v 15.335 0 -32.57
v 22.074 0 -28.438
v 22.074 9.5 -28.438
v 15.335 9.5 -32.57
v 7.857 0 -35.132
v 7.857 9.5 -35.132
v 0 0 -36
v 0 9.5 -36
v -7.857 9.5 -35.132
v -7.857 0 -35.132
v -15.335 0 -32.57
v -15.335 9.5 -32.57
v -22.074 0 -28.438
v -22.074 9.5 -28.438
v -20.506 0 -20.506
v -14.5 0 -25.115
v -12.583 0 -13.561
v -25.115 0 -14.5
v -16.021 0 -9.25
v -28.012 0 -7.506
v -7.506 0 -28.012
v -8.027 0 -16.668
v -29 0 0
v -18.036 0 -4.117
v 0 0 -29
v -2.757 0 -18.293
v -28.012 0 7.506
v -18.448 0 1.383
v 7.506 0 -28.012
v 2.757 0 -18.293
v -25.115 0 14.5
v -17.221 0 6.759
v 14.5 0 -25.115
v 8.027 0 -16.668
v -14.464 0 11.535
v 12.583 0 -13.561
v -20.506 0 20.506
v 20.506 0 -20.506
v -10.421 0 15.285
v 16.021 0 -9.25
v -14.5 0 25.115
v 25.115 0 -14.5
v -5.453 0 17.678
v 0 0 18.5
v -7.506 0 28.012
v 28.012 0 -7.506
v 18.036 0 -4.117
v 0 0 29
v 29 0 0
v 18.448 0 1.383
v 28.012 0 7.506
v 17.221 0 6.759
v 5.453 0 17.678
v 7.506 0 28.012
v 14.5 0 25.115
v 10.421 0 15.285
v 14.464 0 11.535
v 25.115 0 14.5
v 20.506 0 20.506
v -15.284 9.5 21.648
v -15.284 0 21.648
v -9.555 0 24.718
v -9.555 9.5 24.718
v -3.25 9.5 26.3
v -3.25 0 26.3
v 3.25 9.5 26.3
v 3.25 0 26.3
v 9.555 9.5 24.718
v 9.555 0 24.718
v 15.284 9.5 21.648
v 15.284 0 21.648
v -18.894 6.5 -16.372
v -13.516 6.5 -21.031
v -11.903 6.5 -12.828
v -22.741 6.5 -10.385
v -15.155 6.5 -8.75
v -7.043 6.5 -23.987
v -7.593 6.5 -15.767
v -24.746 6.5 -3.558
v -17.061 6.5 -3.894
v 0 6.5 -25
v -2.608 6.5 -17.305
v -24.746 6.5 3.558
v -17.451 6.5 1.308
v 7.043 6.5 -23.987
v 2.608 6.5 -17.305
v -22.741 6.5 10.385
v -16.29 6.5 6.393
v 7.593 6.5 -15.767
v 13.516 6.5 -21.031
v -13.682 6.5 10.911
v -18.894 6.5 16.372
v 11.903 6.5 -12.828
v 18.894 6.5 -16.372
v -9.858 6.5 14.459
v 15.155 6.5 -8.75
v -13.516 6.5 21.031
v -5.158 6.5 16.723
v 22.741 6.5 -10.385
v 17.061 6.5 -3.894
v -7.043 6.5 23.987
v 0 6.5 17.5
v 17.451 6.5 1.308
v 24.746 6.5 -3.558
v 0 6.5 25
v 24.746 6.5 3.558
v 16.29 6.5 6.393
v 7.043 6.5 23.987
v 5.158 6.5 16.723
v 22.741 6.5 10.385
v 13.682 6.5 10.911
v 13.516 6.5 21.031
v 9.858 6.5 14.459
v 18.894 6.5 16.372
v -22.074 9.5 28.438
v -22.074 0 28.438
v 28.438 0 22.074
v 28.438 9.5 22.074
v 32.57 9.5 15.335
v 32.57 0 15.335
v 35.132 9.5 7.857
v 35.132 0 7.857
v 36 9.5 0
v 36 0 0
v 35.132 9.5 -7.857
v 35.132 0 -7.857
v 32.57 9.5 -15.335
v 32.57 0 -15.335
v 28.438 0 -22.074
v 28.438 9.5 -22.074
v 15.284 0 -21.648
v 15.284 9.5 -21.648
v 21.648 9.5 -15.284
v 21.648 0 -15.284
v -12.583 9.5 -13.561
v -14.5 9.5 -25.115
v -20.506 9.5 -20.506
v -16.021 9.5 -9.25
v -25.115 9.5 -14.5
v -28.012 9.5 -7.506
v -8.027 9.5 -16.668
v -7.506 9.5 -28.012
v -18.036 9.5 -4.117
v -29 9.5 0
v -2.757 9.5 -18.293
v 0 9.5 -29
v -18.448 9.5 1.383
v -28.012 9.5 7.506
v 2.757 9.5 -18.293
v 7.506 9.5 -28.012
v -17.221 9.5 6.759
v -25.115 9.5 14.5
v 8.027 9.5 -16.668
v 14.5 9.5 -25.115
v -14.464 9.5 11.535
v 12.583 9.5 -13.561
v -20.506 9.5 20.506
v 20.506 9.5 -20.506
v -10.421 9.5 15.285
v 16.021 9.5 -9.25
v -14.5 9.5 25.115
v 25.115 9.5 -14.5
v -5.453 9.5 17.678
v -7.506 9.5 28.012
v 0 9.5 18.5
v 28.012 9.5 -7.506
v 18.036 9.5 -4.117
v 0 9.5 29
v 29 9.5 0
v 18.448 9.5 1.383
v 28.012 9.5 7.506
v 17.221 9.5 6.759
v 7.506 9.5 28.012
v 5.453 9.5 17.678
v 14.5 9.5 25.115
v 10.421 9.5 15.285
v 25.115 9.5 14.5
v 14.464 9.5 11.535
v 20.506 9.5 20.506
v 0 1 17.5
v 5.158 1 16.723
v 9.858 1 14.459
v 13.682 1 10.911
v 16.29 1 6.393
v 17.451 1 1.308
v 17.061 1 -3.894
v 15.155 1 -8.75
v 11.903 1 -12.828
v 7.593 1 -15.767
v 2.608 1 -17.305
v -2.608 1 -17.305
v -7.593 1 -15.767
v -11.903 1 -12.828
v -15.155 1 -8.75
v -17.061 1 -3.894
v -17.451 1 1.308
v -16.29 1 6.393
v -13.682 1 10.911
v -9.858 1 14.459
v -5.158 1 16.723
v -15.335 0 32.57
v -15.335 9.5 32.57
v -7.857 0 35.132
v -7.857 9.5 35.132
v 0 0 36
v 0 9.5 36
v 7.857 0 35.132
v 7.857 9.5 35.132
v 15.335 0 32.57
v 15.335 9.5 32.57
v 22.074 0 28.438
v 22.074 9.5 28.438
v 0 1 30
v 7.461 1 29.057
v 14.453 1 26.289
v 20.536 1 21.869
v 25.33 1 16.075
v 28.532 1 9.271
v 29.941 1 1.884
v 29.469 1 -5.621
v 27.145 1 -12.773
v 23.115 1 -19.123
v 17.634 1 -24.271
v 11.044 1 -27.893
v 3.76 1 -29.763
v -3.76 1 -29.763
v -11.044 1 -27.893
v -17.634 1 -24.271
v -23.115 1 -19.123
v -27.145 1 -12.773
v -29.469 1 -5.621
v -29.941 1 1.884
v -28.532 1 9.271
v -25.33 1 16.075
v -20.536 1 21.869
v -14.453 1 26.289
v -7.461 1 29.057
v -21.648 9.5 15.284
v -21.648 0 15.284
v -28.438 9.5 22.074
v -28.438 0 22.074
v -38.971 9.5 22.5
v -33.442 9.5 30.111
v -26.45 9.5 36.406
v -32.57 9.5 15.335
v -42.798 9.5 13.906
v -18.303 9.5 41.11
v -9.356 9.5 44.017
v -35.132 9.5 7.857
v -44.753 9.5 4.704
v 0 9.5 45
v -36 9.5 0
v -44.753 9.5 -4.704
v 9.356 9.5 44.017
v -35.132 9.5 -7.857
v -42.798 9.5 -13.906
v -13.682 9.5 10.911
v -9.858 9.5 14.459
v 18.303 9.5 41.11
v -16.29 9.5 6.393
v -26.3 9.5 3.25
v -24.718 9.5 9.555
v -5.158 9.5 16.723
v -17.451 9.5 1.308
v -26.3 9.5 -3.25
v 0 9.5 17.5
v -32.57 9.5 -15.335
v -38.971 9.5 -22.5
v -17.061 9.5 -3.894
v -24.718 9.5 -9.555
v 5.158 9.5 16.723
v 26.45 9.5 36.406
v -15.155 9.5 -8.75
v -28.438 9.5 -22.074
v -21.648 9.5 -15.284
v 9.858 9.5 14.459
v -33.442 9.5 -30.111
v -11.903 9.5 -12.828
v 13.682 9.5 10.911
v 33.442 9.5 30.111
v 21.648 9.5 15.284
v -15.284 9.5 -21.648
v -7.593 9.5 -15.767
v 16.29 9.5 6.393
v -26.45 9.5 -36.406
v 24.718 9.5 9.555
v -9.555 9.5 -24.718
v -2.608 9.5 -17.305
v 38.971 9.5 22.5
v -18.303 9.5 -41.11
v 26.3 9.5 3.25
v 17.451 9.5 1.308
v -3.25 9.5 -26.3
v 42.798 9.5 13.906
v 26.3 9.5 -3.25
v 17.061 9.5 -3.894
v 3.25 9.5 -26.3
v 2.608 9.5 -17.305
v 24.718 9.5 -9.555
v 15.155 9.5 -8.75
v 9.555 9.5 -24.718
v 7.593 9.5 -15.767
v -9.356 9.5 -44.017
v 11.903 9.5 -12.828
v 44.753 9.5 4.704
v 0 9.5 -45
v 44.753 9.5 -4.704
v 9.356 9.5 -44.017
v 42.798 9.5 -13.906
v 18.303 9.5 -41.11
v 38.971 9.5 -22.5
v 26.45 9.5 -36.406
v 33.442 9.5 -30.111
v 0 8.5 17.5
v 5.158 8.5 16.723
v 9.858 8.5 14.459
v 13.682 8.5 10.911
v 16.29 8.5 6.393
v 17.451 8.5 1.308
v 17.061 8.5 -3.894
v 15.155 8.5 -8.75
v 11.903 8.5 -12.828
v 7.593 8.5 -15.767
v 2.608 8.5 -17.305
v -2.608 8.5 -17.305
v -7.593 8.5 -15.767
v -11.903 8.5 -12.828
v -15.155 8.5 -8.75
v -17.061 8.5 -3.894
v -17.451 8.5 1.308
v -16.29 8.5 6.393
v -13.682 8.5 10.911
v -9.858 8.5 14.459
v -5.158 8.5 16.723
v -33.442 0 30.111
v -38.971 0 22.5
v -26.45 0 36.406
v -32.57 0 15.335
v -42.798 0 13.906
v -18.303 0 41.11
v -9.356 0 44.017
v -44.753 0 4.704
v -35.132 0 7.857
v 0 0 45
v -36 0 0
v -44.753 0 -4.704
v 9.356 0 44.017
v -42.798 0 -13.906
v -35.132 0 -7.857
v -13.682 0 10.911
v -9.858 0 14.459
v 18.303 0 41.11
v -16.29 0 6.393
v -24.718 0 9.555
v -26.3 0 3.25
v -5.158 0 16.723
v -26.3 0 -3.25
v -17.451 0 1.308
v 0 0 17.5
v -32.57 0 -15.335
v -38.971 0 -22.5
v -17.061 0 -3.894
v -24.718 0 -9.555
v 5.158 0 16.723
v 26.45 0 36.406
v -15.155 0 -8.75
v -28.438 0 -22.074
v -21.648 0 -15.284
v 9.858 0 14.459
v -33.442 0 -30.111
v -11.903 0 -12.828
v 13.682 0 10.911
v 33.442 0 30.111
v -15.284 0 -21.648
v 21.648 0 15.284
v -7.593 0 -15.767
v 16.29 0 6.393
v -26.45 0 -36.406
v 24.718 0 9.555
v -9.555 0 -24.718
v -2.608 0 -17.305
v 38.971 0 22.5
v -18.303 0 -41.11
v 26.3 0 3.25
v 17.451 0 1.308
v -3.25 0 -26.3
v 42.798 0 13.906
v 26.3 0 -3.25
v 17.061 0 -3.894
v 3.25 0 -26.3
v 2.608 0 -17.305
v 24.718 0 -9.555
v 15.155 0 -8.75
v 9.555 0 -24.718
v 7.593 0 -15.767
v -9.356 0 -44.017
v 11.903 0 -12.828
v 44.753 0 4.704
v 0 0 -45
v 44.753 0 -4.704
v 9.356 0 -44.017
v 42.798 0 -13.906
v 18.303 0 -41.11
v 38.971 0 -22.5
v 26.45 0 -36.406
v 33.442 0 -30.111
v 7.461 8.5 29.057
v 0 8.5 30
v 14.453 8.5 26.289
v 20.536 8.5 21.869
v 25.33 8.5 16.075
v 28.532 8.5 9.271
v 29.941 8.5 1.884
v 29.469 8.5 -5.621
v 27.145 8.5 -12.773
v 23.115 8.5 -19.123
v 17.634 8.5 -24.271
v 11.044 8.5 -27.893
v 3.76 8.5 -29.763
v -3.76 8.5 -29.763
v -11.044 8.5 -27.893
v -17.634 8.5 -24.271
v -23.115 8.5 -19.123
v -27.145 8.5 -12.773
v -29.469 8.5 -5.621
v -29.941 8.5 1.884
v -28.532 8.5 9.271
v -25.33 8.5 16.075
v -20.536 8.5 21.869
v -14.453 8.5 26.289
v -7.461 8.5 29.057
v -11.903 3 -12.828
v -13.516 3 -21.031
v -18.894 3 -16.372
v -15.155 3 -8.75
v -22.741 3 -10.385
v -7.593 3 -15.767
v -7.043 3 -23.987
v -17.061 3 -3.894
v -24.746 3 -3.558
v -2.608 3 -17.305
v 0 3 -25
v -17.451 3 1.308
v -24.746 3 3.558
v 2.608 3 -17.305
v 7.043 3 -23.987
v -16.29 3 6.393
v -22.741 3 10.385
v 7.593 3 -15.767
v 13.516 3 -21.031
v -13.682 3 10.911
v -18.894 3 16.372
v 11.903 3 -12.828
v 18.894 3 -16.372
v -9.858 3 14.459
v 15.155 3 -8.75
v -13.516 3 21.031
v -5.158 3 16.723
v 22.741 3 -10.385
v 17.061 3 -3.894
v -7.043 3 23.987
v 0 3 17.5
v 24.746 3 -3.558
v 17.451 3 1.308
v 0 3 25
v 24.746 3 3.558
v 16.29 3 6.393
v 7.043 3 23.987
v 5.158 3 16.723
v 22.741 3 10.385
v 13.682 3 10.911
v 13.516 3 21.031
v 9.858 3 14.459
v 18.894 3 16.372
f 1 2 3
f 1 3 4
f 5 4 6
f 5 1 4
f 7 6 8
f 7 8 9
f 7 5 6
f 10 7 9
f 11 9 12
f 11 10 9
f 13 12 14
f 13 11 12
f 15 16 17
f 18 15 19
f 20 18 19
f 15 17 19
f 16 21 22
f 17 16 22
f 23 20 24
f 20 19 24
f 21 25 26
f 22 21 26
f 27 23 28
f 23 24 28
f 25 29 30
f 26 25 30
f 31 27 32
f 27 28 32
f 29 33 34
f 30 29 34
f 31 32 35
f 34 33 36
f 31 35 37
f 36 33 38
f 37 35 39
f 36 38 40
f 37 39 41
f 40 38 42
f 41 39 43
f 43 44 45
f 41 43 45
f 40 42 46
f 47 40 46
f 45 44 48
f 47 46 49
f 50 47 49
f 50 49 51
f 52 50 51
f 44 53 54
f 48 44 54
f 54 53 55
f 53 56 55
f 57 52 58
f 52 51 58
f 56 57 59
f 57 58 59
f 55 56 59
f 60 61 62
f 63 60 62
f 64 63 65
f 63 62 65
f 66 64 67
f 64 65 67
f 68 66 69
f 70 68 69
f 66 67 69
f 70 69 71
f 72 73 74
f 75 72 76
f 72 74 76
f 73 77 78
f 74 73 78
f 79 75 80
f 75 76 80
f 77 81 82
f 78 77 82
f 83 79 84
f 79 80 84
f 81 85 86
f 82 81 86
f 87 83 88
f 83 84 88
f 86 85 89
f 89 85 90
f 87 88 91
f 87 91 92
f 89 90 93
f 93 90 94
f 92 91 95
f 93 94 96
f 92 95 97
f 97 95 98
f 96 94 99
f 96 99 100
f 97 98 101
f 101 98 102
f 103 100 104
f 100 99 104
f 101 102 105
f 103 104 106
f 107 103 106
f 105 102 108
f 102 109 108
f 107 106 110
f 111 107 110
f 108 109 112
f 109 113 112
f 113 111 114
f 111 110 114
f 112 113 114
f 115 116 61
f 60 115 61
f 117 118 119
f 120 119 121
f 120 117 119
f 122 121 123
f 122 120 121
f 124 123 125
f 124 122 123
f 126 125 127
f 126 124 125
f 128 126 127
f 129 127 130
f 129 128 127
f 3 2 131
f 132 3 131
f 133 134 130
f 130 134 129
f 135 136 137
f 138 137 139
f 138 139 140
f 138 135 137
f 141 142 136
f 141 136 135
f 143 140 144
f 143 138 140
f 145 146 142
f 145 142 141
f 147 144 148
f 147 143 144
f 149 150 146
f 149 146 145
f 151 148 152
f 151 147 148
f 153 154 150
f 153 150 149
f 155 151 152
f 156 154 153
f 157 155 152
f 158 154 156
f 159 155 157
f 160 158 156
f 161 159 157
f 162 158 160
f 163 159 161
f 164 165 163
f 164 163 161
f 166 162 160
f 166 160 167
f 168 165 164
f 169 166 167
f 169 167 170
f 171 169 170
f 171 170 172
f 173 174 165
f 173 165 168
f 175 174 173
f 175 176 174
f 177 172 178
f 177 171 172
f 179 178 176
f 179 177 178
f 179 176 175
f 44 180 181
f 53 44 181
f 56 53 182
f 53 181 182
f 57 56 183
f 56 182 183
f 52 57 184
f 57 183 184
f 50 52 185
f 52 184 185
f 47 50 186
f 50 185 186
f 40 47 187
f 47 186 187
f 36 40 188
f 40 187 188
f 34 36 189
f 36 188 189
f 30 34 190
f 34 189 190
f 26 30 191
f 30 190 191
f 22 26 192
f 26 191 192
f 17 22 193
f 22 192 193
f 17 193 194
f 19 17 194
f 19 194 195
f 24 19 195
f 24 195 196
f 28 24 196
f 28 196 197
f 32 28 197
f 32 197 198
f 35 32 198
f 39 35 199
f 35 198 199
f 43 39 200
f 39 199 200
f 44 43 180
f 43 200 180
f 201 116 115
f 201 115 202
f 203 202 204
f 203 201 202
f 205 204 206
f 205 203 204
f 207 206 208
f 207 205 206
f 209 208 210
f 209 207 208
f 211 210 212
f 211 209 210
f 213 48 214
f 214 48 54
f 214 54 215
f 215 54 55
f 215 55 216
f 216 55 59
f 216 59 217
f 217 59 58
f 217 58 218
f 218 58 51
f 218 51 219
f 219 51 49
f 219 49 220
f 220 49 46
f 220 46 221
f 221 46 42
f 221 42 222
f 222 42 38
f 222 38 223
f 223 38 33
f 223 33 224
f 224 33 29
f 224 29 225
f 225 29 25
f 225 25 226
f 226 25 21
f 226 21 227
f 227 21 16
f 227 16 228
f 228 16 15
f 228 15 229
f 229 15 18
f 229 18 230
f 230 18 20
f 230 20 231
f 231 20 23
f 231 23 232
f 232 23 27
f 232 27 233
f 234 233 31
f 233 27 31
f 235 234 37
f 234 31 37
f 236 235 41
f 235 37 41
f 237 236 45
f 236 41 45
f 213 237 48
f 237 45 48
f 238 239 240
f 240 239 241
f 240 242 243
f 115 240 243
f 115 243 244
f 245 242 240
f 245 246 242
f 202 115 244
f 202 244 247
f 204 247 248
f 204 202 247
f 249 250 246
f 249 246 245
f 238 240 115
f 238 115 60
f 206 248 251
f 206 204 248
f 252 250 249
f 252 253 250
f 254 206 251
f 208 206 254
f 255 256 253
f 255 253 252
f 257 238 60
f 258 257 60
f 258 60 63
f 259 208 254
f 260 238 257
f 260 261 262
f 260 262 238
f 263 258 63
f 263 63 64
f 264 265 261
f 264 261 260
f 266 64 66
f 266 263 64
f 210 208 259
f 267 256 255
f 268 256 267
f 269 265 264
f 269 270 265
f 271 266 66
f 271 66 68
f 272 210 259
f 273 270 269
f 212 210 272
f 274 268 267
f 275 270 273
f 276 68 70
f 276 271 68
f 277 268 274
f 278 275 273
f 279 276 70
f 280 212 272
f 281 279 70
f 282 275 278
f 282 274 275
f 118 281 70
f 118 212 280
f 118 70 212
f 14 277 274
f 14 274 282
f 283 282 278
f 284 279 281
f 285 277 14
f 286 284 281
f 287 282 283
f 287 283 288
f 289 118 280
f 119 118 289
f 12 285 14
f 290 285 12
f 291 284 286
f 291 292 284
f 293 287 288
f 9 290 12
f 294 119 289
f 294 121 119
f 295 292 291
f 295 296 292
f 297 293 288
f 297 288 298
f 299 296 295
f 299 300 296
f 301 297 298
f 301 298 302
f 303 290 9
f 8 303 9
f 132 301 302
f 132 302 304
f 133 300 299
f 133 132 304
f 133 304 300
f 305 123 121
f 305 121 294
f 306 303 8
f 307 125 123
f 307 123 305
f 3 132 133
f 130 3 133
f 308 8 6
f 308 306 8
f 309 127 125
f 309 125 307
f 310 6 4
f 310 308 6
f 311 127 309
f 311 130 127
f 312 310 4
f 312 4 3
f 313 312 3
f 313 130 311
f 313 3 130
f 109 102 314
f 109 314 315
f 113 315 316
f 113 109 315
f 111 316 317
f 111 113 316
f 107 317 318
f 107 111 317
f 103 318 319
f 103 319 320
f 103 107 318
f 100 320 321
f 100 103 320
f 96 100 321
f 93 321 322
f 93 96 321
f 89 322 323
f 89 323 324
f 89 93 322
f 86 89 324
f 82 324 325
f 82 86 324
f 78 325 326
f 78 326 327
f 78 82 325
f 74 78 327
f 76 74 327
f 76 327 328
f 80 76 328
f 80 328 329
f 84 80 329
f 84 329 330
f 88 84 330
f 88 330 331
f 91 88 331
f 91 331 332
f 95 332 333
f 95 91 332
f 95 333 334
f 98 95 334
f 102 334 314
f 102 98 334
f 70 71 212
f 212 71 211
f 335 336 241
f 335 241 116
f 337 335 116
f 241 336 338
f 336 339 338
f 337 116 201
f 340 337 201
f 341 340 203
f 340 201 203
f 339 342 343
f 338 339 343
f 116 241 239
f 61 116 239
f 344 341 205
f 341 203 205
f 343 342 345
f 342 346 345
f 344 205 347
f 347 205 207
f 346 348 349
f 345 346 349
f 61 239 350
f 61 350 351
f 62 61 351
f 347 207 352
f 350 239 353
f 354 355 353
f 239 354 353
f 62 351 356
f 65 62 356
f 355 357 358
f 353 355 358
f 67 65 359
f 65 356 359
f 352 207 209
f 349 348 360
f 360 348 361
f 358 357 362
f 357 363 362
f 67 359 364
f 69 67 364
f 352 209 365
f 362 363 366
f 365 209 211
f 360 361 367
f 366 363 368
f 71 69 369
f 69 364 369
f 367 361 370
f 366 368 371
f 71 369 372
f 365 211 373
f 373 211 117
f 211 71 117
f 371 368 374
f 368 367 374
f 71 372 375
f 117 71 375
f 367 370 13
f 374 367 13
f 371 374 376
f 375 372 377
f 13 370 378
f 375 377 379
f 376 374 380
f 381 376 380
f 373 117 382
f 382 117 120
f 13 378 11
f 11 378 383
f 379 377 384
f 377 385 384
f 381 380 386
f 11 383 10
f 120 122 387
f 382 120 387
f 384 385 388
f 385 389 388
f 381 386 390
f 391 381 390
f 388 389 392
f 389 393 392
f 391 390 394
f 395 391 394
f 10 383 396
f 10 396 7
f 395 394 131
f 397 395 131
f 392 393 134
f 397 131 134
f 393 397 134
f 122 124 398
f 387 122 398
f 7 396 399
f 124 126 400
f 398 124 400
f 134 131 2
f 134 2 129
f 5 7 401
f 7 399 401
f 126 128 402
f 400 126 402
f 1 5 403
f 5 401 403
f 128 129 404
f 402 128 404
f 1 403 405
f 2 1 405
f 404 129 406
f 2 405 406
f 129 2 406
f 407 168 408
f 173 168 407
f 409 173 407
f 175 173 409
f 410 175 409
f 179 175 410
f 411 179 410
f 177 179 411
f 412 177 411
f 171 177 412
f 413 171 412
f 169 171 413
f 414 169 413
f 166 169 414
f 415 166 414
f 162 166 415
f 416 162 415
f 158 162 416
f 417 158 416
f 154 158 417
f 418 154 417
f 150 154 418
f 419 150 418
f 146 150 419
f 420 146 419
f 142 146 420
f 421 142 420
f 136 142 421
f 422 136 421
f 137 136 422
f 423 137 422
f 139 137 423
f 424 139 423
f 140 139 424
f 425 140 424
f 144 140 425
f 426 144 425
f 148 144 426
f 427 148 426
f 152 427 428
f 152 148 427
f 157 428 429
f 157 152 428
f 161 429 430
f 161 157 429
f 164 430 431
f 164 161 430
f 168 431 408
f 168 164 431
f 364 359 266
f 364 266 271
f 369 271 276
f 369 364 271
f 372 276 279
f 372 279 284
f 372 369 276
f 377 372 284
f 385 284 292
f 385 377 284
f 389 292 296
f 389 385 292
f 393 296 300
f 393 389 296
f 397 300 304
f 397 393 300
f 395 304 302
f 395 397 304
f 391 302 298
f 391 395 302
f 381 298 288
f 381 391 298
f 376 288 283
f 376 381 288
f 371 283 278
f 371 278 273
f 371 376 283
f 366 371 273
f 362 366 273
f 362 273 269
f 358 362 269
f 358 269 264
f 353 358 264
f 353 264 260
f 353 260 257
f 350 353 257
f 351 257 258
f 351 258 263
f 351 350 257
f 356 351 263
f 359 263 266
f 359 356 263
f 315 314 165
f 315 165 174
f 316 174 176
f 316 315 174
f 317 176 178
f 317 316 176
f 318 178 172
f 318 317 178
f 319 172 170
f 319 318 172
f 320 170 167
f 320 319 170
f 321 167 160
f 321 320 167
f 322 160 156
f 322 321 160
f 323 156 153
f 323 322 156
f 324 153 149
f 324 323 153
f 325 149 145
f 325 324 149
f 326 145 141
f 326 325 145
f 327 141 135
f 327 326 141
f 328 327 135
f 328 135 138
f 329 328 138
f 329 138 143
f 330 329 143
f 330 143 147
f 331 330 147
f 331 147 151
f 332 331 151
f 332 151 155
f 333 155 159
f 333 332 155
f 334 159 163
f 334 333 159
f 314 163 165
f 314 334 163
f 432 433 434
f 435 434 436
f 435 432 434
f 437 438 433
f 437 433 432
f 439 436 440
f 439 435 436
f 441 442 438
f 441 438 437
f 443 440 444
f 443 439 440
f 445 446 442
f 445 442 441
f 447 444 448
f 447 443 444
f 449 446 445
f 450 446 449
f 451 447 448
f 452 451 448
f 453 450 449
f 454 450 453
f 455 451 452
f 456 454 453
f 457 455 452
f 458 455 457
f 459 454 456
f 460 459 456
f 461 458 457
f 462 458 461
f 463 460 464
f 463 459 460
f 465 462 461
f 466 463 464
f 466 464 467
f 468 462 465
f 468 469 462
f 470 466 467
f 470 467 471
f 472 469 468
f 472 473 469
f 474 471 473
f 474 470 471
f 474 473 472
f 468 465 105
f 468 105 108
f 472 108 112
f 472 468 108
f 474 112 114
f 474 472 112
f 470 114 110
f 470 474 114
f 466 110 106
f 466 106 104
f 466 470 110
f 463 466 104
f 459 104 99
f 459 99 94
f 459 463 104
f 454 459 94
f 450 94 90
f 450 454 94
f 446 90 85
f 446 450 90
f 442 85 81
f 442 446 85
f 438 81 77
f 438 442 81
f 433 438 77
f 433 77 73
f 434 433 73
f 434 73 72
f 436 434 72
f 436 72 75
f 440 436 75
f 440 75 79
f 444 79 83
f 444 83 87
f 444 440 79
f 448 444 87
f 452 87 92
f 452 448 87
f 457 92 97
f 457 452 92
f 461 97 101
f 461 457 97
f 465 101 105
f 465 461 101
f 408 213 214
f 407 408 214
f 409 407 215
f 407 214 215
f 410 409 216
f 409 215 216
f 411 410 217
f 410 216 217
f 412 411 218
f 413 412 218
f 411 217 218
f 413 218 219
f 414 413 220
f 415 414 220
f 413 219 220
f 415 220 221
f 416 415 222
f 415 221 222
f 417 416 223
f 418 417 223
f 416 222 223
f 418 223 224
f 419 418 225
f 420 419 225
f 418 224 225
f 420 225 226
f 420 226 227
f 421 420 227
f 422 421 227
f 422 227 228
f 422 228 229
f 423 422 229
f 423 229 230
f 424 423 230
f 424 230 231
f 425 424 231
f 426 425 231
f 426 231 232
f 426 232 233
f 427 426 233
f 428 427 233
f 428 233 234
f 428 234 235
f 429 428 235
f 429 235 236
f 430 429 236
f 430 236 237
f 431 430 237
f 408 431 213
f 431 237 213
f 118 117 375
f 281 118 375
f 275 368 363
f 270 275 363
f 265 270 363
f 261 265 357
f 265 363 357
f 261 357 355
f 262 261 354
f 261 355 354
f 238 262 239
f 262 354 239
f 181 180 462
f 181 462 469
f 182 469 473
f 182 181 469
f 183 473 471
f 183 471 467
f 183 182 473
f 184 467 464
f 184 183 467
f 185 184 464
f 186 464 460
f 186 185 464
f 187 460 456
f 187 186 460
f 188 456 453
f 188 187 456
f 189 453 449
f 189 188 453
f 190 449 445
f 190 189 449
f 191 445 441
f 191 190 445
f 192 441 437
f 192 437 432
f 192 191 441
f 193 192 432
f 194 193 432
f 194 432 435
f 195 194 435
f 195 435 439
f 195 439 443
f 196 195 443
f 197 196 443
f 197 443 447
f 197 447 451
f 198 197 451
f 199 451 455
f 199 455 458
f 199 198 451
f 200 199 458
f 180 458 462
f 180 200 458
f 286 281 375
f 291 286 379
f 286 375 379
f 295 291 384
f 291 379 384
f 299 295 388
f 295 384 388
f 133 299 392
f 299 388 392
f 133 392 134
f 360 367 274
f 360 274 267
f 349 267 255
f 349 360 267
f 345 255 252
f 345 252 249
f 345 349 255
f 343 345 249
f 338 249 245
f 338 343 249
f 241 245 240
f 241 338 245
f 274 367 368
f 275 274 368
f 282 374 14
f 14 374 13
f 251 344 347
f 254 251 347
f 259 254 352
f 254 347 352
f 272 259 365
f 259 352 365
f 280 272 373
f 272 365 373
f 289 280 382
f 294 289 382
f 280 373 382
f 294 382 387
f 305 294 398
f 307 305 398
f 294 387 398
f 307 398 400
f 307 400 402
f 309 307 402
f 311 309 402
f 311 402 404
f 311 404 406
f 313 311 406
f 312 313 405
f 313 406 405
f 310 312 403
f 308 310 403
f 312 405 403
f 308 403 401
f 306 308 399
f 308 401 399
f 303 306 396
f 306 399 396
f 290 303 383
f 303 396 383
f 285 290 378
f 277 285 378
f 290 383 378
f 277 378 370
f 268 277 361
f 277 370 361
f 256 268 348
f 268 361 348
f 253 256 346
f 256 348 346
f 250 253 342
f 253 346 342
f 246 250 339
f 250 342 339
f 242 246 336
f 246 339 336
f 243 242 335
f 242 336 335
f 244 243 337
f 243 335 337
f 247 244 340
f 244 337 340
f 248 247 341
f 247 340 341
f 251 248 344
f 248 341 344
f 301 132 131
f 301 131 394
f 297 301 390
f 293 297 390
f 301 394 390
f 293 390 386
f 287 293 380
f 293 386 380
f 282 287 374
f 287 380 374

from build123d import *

# Parameters (mm, degrees)
SKETCH2_R           = 45
SKETCH2_R_2         = 36
SKETCH2_R_3         = 26.5
SKETCH2_R_4         = 17.5
BOSS_EXTRUDE2_DEPTH = 9.5
SKETCH4_R           = 30
SKETCH4_R_2         = 17.5
BOSS_EXTRUDE3_DEPTH = 3
SKETCH5_R           = 30
SKETCH5_R_2         = 25
BOSS_EXTRUDE4_DEPTH = 3.5
SKETCH7_R           = 30
SKETCH7_R_2         = 17.5
BOSS_EXTRUDE5_DEPTH = 3
CHAMFER1_SIZE       = 1
CHAMFER2_SIZE       = 1
CHAMFER3_SIZE       = 1
CHAMFER4_SIZE       = 1


with BuildPart() as part:
    # Sketch2 → Boss-Extrude2 (new body)
    # profile 1 of 6: a face of its own
    with BuildSketch(Plane(origin=(0, 0, 0), x_dir=(1, 0, 0), z_dir=(0, 1, 0))):
        with Locations(Location((0, 0, 0), (0, 0, 270))):
            Circle(SKETCH2_R)
        Circle(SKETCH2_R_2, mode=Mode.SUBTRACT)
    # profile 2 of 6: a face of its own
    with BuildSketch(Plane(origin=(0, 0, 0), x_dir=(1, 0, 0), z_dir=(0, 1, 0))):
        with BuildLine():
            Line((22.074206845, 28.438167876), (15.284204797, 21.648165828))
            ThreePointArc((15.284204797, 21.648165828), (18.738329701, 18.738329701), (21.648165828, 15.284204797))
            Line((21.648165828, 15.284204797), (28.438167876, 22.074206845))
            ThreePointArc((28.438167876, 22.074206845), (25.455844123, 25.455844123), (22.074206845, 28.438167876))
        make_face()
    # profile 3 of 6: a face of its own
    with BuildSketch(Plane(origin=(0, 0, 0), x_dir=(1, 0, 0), z_dir=(0, 1, 0))):
        with BuildLine():
            Line((28.438167876, -22.074206845), (21.648165828, -15.284204797))
            ThreePointArc((21.648165828, -15.284204797), (18.738329701, -18.738329701), (15.284204797, -21.648165828))
            Line((15.284204797, -21.648165828), (22.074206845, -28.438167876))
            ThreePointArc((22.074206845, -28.438167876), (25.455844123, -25.455844123), (28.438167876, -22.074206845))
        make_face()
    # profile 4 of 6: a face of its own
    with BuildSketch(Plane(origin=(0, 0, 0), x_dir=(1, 0, 0), z_dir=(0, 1, 0))):
        with BuildLine():
            ThreePointArc((-15.284204797, -21.648165828), (-18.738329701, -18.738329701), (-21.648165828, -15.284204797))
            Line((-21.648165828, -15.284204797), (-28.438167876, -22.074206845))
            ThreePointArc((-28.438167876, -22.074206845), (-25.455844123, -25.455844123), (-22.074206845, -28.438167876))
            Line((-22.074206845, -28.438167876), (-15.284204797, -21.648165828))
        make_face()
    # profile 5 of 6: a face of its own
    with BuildSketch(Plane(origin=(0, 0, 0), x_dir=(1, 0, 0), z_dir=(0, 1, 0))):
        with BuildLine():
            ThreePointArc((-21.648165828, 15.284204797), (-18.738329701, 18.738329701), (-15.284204797, 21.648165828))
            Line((-15.284204797, 21.648165828), (-22.074206845, 28.438167876))
            ThreePointArc((-22.074206845, 28.438167876), (-25.455844123, 25.455844123), (-28.438167876, 22.074206845))
            Line((-28.438167876, 22.074206845), (-21.648165828, 15.284204797))
        make_face()
    # profile 6 of 6: a face of its own
    with BuildSketch(Plane(origin=(0, 0, 0), x_dir=(1, 0, 0), z_dir=(0, 1, 0))):
        Circle(SKETCH2_R_3)
        with Locations(Location((0, 0, 0), (0, 0, 270))):
            Circle(SKETCH2_R_4, mode=Mode.SUBTRACT)
    extrude(amount=BOSS_EXTRUDE2_DEPTH)


with BuildPart() as body_2:
    # Sketch4 → Boss-Extrude3 (new body)
    with BuildSketch(Plane(origin=(0, 0, 0), x_dir=(1, 0, 0), z_dir=(0, 1, 0))):
        with Locations(Location((0, 0, 0), (0, 0, 270))):
            Circle(SKETCH4_R)
        with Locations(Location((0, 0, 0), (0, 0, 270))):
            Circle(SKETCH4_R_2, mode=Mode.SUBTRACT)
    extrude(amount=BOSS_EXTRUDE3_DEPTH)

    # Sketch5 → Boss-Extrude4 (add)
    with BuildSketch(Plane(origin=(0, 3, 0), x_dir=(1, 0, 0), z_dir=(0, 1, 0))):
        with Locations(Location((0, 0, 0), (0, 0, 270))):
            Circle(SKETCH5_R)
        with Locations(Location((0, 0, 0), (0, 0, 270))):
            Circle(SKETCH5_R_2, mode=Mode.SUBTRACT)
    extrude(amount=BOSS_EXTRUDE4_DEPTH)

    # Sketch7 → Boss-Extrude5 (add)
    with BuildSketch(Plane(origin=(0, 6.5, 0), x_dir=(1, 0, 0), z_dir=(0, 1, 0))):
        with Locations(Location((0, 0, 0), (0, 0, 270))):
            Circle(SKETCH7_R)
        with Locations(Location((0, 0, 0), (0, 0, 270))):
            Circle(SKETCH7_R_2, mode=Mode.SUBTRACT)
    extrude(amount=BOSS_EXTRUDE5_DEPTH)

    # Chamfer1
    chamfer1_edges = [body_2.edges().sort_by_distance(p)[0] for p in [
        (0, 9.5, -30),
    ]]
    chamfer(chamfer1_edges, length=CHAMFER1_SIZE)

    # Chamfer2
    chamfer2_edges = [body_2.edges().sort_by_distance(p)[0] for p in [
        (0, 0, -30),
    ]]
    chamfer(chamfer2_edges, length=CHAMFER2_SIZE)

    # Chamfer3
    chamfer3_edges = [body_2.edges().sort_by_distance(p)[0] for p in [
        (0, 0, -17.5),
    ]]
    chamfer(chamfer3_edges, length=CHAMFER3_SIZE)

    # Chamfer4
    chamfer4_edges = [body_2.edges().sort_by_distance(p)[0] for p in [
        (0, 9.5, -17.5),
    ]]
    chamfer(chamfer4_edges, length=CHAMFER4_SIZE)


solid = Compound([part.part, body_2.part])
